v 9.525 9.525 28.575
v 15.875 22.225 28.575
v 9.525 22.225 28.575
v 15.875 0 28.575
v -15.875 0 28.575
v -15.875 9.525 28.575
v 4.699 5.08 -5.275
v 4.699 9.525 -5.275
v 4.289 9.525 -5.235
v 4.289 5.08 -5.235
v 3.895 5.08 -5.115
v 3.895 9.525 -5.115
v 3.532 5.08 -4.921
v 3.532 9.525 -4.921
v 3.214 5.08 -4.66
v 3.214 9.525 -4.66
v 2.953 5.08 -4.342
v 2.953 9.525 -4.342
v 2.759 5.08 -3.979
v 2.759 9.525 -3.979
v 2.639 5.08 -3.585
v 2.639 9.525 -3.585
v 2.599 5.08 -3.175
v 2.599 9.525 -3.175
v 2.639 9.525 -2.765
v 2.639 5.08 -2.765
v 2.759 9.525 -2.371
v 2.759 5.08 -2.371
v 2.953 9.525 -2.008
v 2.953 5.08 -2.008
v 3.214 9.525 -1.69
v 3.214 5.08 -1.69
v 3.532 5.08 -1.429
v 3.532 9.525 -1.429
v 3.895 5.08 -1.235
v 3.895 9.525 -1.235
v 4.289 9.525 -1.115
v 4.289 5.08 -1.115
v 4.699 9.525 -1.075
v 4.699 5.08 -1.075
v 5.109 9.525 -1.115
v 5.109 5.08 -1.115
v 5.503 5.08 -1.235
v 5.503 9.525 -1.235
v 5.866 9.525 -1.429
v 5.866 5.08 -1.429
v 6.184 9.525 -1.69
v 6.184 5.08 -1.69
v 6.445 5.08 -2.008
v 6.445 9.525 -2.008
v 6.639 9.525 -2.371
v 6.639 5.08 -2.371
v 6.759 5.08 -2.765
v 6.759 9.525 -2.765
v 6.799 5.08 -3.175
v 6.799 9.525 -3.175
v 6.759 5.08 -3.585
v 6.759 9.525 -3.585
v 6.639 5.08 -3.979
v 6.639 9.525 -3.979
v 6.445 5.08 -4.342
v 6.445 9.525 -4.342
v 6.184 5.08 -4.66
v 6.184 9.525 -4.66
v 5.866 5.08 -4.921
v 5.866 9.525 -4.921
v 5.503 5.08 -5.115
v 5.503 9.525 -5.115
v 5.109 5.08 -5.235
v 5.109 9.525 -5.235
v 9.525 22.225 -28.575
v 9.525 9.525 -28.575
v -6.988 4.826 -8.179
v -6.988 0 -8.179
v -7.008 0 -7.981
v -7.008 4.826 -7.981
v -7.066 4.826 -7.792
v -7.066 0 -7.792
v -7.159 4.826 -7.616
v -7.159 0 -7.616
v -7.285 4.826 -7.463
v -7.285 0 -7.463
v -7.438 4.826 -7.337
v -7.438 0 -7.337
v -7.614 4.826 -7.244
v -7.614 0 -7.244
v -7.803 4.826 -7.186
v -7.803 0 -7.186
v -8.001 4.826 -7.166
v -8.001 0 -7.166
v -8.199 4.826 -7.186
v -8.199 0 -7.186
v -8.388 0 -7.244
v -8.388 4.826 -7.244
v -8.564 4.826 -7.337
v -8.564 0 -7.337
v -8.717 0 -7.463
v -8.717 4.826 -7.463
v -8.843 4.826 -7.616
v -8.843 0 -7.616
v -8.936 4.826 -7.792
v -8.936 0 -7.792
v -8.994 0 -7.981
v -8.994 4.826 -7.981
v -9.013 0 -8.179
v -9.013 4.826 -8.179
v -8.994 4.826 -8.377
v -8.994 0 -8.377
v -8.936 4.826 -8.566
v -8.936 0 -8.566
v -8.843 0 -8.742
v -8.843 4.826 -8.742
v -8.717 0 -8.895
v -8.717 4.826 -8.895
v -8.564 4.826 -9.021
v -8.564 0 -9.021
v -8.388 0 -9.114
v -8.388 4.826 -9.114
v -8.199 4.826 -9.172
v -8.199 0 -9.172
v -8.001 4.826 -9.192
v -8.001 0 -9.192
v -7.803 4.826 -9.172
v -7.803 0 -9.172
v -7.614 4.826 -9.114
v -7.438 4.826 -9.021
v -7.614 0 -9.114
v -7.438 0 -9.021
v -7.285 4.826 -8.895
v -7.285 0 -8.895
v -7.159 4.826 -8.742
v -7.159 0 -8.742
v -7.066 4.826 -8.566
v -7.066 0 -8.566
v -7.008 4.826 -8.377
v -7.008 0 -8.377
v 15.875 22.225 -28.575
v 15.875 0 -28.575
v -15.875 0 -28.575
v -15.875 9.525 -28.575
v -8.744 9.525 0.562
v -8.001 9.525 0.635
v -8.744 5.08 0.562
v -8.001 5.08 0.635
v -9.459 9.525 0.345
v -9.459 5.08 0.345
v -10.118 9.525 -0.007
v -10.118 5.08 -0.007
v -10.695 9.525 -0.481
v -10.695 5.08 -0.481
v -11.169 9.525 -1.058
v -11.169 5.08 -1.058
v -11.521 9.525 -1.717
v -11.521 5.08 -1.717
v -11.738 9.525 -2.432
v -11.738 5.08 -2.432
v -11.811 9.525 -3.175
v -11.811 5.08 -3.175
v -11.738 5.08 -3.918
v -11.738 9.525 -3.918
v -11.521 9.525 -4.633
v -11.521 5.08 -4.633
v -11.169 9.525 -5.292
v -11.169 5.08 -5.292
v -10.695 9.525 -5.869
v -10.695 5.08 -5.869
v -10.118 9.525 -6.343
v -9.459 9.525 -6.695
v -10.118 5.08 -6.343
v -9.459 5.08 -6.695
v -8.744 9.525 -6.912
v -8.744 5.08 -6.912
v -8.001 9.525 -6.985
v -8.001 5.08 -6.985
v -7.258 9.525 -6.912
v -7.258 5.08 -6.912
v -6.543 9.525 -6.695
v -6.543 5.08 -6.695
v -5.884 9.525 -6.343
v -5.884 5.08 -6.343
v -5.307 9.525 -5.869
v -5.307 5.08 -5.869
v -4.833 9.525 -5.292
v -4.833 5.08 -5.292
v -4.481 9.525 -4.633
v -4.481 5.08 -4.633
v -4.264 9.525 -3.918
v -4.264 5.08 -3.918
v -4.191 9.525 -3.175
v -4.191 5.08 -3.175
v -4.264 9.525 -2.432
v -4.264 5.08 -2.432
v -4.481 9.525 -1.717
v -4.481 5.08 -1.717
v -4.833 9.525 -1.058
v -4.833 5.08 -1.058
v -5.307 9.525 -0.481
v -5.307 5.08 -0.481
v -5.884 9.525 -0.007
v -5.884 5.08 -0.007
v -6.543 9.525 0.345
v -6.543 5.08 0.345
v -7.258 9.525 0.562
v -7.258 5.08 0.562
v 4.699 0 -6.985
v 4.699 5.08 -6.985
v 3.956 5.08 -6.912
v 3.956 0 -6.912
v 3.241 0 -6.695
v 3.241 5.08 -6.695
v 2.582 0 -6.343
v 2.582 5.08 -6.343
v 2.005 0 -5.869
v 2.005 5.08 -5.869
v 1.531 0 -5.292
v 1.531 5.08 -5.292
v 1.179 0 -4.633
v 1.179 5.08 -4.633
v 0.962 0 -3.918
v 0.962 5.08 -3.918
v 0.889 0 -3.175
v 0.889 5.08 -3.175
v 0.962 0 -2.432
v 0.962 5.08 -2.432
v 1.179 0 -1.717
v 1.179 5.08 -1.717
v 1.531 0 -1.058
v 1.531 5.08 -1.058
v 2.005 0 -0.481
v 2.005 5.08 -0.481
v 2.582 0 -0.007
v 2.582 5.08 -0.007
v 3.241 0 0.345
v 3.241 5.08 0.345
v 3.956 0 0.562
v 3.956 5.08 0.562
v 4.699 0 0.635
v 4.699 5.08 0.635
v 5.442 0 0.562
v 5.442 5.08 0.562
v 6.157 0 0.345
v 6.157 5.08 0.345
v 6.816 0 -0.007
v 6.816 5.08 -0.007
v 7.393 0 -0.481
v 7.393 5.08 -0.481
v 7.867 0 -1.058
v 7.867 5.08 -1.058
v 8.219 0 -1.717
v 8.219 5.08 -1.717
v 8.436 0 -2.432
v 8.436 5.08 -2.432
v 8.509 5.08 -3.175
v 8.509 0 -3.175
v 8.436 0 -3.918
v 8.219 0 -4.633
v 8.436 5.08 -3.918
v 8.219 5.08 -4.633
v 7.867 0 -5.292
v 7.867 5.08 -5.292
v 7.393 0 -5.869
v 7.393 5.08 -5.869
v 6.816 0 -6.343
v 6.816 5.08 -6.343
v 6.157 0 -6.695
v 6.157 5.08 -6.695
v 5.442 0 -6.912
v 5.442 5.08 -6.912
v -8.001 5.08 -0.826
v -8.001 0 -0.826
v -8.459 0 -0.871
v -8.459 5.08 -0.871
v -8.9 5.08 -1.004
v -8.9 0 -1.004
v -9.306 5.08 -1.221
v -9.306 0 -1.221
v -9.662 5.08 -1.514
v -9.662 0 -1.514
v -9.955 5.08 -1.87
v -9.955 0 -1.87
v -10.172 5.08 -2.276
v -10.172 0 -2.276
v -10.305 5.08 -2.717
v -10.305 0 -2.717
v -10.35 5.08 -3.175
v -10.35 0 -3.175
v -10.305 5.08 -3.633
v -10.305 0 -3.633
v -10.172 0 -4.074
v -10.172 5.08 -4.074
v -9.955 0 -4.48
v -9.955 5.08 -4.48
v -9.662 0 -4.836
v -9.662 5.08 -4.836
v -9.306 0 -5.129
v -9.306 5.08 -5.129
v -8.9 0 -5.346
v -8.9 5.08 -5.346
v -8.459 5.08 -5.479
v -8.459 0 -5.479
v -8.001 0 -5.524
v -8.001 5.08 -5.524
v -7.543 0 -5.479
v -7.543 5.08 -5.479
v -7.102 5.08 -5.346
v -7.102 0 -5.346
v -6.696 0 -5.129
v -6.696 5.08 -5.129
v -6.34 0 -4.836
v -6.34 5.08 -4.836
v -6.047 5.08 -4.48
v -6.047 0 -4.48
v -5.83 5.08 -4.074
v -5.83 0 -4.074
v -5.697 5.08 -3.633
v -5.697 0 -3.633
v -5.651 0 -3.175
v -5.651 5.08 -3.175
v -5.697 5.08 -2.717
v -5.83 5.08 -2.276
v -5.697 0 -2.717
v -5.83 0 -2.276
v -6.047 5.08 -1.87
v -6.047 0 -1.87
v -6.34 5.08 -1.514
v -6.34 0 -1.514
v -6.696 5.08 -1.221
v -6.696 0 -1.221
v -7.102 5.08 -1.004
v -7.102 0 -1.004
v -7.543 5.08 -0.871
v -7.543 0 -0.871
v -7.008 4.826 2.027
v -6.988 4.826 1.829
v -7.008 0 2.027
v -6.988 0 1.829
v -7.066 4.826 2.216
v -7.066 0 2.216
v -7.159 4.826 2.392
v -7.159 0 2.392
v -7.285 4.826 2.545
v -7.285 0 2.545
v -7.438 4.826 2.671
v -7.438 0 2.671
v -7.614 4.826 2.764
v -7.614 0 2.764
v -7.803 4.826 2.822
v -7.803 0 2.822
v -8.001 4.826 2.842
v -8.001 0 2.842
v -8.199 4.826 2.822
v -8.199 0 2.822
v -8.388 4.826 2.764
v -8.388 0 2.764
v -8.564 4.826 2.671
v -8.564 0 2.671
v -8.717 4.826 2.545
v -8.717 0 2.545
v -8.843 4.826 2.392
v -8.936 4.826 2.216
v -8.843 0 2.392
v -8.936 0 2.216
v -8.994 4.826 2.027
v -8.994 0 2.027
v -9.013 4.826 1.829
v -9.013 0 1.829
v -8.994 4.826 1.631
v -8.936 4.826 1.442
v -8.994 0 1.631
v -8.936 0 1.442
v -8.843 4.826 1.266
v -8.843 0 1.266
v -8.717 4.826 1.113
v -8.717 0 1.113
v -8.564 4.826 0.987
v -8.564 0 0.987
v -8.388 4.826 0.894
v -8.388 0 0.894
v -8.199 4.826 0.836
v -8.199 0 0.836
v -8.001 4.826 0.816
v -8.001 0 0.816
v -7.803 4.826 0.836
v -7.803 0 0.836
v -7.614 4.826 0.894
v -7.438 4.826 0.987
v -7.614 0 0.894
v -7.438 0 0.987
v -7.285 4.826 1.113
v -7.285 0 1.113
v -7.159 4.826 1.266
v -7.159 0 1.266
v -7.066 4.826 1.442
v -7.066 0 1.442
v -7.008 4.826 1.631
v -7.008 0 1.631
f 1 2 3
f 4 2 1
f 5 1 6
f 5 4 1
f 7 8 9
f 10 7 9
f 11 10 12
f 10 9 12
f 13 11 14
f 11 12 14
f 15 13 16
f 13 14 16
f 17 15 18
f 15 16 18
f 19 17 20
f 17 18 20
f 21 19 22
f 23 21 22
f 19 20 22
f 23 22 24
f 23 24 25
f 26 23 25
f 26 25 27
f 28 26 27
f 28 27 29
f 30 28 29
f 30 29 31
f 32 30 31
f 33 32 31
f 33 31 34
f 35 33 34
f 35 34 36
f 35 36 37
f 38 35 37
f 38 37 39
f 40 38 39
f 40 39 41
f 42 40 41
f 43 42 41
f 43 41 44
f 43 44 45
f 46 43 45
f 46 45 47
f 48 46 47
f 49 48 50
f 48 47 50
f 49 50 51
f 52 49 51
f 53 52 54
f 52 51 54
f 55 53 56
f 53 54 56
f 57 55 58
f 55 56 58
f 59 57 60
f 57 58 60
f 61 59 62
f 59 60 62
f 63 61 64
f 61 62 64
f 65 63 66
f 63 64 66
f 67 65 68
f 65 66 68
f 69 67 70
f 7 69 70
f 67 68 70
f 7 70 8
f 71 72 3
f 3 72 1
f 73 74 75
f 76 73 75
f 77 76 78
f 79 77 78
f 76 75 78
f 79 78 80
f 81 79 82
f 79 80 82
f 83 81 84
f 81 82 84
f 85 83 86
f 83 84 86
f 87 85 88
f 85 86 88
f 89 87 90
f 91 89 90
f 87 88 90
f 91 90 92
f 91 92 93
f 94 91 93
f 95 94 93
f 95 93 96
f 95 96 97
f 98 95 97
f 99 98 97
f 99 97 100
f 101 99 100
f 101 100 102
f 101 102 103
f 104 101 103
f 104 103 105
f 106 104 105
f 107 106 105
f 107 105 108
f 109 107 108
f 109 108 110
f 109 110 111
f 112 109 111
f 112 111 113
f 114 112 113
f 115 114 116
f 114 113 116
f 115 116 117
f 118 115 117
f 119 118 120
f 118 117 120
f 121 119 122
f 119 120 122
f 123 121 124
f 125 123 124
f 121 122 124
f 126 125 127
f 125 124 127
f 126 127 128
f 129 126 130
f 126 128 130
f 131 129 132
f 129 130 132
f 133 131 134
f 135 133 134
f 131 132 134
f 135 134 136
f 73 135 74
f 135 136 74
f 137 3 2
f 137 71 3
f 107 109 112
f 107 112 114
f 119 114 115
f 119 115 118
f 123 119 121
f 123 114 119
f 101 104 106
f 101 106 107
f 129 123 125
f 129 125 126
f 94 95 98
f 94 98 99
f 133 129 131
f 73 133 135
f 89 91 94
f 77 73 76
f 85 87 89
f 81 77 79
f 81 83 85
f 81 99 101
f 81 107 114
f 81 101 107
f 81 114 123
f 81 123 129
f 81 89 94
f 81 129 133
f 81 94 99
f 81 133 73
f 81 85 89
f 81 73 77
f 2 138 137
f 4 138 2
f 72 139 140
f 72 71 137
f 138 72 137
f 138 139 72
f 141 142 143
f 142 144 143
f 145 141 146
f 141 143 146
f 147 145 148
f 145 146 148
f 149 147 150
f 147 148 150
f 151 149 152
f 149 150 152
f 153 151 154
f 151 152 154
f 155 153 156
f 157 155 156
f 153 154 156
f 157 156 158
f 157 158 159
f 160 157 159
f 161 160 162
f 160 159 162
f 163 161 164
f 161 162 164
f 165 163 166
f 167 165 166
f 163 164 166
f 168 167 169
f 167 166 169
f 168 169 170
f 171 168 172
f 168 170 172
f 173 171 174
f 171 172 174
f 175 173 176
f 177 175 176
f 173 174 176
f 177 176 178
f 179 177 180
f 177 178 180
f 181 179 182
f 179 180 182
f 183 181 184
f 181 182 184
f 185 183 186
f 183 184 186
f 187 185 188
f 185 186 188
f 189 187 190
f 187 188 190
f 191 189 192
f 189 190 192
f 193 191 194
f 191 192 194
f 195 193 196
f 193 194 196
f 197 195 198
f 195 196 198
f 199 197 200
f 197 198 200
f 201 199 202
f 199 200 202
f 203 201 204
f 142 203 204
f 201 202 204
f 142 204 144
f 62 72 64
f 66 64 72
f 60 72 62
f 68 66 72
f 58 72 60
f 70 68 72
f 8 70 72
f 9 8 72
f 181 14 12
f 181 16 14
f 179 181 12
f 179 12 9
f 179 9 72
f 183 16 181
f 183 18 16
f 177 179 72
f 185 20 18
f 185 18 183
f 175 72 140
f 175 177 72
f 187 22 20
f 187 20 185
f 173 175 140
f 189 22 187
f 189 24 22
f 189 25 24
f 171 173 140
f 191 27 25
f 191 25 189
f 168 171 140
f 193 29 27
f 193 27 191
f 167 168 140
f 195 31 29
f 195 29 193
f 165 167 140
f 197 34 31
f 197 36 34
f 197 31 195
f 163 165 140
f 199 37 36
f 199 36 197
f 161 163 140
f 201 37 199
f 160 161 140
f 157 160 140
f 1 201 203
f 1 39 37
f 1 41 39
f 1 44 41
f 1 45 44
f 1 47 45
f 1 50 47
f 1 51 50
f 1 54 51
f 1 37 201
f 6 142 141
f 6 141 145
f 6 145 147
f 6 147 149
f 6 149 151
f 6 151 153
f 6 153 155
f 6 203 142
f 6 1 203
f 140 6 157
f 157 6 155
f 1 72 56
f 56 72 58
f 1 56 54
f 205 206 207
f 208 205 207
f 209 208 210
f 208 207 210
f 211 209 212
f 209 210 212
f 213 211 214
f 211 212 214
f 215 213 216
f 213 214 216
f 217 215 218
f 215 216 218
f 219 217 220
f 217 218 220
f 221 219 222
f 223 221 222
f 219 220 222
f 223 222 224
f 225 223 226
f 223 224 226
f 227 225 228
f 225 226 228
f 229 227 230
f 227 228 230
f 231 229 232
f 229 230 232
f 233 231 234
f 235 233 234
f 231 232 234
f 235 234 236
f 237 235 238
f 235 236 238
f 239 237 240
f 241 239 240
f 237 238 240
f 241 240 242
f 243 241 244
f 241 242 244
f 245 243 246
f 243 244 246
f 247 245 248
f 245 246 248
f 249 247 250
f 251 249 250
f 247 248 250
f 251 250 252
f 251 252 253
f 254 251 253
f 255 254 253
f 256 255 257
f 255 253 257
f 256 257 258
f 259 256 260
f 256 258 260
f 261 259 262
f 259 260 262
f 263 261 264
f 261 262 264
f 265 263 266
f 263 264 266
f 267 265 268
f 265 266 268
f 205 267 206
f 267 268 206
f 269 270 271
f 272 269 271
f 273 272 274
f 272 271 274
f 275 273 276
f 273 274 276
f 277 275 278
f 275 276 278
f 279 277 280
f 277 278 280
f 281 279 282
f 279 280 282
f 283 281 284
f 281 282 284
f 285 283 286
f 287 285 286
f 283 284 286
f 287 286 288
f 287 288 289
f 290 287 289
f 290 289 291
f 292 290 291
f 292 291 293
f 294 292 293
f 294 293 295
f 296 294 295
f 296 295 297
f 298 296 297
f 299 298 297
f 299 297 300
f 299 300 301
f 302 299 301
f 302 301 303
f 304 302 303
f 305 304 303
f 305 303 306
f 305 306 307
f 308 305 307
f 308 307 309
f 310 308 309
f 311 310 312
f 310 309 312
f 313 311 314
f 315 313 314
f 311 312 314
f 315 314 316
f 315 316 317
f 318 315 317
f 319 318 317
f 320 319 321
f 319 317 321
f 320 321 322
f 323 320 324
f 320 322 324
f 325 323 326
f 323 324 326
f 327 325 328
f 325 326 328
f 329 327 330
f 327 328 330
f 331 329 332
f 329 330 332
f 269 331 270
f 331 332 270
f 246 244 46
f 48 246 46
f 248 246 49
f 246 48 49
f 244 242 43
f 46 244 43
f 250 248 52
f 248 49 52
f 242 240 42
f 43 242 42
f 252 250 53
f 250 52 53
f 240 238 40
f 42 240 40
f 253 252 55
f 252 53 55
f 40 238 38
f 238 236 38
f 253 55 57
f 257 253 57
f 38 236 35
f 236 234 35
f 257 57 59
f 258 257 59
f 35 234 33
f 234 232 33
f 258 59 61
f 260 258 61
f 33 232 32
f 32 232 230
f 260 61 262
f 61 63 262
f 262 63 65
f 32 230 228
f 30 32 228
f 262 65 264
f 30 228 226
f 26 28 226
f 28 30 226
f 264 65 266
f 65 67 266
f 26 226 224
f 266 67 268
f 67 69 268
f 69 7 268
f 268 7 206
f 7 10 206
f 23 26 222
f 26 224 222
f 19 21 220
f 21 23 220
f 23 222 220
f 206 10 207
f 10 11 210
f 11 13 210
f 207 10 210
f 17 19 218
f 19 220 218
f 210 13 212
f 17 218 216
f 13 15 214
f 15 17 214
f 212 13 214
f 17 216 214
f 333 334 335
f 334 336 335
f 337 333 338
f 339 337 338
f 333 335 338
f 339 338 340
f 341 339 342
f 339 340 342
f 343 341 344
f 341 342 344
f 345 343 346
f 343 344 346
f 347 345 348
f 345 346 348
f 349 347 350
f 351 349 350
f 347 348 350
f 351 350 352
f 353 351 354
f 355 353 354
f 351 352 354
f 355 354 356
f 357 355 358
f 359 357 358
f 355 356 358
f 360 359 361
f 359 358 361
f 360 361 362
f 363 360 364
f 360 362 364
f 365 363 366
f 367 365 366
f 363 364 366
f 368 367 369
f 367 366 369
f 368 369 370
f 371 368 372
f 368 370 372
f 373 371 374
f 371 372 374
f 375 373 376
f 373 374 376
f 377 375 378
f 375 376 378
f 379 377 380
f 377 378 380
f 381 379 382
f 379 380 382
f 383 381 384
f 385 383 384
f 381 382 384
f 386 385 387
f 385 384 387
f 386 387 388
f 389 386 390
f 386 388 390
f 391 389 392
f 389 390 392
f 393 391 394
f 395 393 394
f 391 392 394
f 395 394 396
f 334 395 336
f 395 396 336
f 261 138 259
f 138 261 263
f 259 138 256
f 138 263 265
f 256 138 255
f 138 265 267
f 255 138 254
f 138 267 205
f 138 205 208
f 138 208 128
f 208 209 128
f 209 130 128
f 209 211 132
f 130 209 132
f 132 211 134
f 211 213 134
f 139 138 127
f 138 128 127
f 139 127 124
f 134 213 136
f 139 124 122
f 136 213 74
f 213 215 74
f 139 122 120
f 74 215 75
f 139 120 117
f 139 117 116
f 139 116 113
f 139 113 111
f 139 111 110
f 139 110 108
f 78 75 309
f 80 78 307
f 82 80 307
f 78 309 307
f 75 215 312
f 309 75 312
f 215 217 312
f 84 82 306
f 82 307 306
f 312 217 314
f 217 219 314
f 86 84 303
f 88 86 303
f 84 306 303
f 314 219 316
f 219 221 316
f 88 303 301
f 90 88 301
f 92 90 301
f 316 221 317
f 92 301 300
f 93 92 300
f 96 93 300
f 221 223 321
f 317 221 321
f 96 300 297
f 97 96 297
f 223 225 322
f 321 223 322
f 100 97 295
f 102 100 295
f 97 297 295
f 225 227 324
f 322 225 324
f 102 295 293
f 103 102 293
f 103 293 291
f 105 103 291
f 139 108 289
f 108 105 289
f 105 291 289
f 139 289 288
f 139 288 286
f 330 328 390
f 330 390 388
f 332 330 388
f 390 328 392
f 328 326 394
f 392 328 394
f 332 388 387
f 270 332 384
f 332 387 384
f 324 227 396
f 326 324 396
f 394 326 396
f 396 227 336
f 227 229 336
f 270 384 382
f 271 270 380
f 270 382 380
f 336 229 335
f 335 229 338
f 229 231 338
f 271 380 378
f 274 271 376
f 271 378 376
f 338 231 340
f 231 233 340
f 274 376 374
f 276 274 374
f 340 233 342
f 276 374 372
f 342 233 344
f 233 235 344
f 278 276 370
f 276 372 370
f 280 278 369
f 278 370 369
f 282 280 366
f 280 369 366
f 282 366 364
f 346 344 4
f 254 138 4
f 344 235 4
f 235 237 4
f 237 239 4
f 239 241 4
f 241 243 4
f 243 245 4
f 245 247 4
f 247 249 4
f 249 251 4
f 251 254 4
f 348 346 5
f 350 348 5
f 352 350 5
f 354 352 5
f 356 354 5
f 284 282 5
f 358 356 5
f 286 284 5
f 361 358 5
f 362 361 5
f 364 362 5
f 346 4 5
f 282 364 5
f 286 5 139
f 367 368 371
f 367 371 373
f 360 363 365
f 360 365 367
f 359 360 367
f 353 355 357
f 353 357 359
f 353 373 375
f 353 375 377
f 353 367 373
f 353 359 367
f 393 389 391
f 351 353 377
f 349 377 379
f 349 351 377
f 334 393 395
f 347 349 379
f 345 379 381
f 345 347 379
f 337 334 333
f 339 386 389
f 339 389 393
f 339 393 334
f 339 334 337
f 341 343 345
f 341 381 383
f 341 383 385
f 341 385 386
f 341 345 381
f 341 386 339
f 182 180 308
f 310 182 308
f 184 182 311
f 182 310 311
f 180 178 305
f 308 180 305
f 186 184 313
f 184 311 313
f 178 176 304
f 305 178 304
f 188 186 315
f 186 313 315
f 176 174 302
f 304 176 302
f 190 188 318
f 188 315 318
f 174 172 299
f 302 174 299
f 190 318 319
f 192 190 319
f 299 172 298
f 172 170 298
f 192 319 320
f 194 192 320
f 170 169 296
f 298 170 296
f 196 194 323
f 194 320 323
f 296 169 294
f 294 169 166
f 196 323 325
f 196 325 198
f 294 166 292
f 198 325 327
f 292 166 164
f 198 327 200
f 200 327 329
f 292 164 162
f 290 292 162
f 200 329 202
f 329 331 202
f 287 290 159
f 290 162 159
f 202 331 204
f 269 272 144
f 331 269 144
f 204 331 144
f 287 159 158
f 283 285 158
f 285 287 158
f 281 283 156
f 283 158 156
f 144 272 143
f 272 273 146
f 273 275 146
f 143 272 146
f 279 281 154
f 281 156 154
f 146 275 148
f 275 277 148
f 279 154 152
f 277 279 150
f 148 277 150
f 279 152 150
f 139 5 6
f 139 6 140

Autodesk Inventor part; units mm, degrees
ref_plane "YZ Plane" through (0, 0, 0) normal (1, 0, 0) x (0, 1, 0)
ref_plane "XZ Plane" through (0, 0, 0) normal (0, 1, 0) x (-1, 0, 0)
ref_plane "XY Plane" through (0, 0, 0) normal (0, 0, 1) x (1, 0, 0)
sketch "Sketch1" plane through (0, 0, 0) normal (0, 1, 0) x (-1, 0, 0)
  line L0 (15.875, -28.575) -> (-15.875, -28.575)
  line L1 (-15.875, -28.575) -> (-15.875, 28.575)
  line L2 (-15.875, 28.575) -> (15.875, 28.575)
  line L3 (15.875, 28.575) -> (15.875, -28.575)
  line L4 (15.875, -28.575) -> (-15.875, 28.575) construction
  line L5 (-15.875, -28.575) -> (15.875, 28.575) construction
  point P0 (0, 0)
  dimension "d0" = 31.75
  dimension "d1" = 57.15
extrude "Extrusion1" add sketch "Sketch1" along normal blind 9.525
sketch "Sketch2" plane through (0, 9.525, 0) normal (0, 1, 0) x (1, 0, 0)
  line L0 (15.875, -28.575) -> (15.875, 28.575) projected
  line L1 (-15.875, -28.575) -> (15.875, -28.575) projected
  line L2 (15.875, 28.575) -> (9.525, 28.575)
  line L3 (9.525, 28.575) -> (9.525, -28.575)
  line L4 (9.525, -28.575) -> (15.875, -28.575)
  line L5 (15.875, -28.575) -> (15.875, 28.575)
  point P0 (0, 0)
  dimension "d4" = 6.35
extrude "Extrusion2" add sketch "Sketch2" along normal blind 12.7
sketch "Sketch3" plane through (0, 0, 0) normal (0, -1, 0) x (1, 0, 0)
  line L0 (-15.875, 28.575) -> (9.525, 28.575) projected
  point P0 (0, 0)
  point P1 (4.699, -3.175)
  dimension "d14" = 4.826
  dimension "d15" = 31.75
hole "Hole1" at (4.699, 0, -3.175) direction (0, 1, 0) diameter 4.2 end through all counterbore diameter 7.62 counterbore depth 5.08
sketch "Sketch5" plane through (0, 9.525, 0) normal (0, 1, 0) x (1, 0, 0)
  line L0 (9.525, 28.575) -> (-15.875, 28.575) projected
  circle A0 centre (4.699, 3.175) radius 3.81 projected
  line L1 (-15.875, -28.575) -> (9.525, -28.575) projected
  point P0 (0, 0)
  point P1 (-8.001, 3.175)
  dimension "d33" = 12.7
  dimension "d40" = 31.75
hole "Hole3" at (-8.001, 9.525, -3.175) direction (0, -1, 0) diameter 4.699 end through all counterbore diameter 7.62 counterbore depth 4.445
sketch "Sketch6" plane through (0, 0, 0) normal (0, -1, 0) x (1, 0, 0)
  circle A0 centre (-8.001, -8.179) radius 1.0125
  circle A1 centre (-8.001, 1.829) radius 1.0125
  circle A2 centre (-8.001, -3.175) radius 2.3495 projected
  point P0 (0, 0)
  dimension "d34" = 2.025
  dimension "d35" = 2.025
  dimension "d36" = 5.004
  dimension "d37" = 5.004
extrude "Extrusion3" cut sketch "Sketch6" against normal blind 4.826 contours A0 | A1
properties part number "Mount for Slit VA100CP"
